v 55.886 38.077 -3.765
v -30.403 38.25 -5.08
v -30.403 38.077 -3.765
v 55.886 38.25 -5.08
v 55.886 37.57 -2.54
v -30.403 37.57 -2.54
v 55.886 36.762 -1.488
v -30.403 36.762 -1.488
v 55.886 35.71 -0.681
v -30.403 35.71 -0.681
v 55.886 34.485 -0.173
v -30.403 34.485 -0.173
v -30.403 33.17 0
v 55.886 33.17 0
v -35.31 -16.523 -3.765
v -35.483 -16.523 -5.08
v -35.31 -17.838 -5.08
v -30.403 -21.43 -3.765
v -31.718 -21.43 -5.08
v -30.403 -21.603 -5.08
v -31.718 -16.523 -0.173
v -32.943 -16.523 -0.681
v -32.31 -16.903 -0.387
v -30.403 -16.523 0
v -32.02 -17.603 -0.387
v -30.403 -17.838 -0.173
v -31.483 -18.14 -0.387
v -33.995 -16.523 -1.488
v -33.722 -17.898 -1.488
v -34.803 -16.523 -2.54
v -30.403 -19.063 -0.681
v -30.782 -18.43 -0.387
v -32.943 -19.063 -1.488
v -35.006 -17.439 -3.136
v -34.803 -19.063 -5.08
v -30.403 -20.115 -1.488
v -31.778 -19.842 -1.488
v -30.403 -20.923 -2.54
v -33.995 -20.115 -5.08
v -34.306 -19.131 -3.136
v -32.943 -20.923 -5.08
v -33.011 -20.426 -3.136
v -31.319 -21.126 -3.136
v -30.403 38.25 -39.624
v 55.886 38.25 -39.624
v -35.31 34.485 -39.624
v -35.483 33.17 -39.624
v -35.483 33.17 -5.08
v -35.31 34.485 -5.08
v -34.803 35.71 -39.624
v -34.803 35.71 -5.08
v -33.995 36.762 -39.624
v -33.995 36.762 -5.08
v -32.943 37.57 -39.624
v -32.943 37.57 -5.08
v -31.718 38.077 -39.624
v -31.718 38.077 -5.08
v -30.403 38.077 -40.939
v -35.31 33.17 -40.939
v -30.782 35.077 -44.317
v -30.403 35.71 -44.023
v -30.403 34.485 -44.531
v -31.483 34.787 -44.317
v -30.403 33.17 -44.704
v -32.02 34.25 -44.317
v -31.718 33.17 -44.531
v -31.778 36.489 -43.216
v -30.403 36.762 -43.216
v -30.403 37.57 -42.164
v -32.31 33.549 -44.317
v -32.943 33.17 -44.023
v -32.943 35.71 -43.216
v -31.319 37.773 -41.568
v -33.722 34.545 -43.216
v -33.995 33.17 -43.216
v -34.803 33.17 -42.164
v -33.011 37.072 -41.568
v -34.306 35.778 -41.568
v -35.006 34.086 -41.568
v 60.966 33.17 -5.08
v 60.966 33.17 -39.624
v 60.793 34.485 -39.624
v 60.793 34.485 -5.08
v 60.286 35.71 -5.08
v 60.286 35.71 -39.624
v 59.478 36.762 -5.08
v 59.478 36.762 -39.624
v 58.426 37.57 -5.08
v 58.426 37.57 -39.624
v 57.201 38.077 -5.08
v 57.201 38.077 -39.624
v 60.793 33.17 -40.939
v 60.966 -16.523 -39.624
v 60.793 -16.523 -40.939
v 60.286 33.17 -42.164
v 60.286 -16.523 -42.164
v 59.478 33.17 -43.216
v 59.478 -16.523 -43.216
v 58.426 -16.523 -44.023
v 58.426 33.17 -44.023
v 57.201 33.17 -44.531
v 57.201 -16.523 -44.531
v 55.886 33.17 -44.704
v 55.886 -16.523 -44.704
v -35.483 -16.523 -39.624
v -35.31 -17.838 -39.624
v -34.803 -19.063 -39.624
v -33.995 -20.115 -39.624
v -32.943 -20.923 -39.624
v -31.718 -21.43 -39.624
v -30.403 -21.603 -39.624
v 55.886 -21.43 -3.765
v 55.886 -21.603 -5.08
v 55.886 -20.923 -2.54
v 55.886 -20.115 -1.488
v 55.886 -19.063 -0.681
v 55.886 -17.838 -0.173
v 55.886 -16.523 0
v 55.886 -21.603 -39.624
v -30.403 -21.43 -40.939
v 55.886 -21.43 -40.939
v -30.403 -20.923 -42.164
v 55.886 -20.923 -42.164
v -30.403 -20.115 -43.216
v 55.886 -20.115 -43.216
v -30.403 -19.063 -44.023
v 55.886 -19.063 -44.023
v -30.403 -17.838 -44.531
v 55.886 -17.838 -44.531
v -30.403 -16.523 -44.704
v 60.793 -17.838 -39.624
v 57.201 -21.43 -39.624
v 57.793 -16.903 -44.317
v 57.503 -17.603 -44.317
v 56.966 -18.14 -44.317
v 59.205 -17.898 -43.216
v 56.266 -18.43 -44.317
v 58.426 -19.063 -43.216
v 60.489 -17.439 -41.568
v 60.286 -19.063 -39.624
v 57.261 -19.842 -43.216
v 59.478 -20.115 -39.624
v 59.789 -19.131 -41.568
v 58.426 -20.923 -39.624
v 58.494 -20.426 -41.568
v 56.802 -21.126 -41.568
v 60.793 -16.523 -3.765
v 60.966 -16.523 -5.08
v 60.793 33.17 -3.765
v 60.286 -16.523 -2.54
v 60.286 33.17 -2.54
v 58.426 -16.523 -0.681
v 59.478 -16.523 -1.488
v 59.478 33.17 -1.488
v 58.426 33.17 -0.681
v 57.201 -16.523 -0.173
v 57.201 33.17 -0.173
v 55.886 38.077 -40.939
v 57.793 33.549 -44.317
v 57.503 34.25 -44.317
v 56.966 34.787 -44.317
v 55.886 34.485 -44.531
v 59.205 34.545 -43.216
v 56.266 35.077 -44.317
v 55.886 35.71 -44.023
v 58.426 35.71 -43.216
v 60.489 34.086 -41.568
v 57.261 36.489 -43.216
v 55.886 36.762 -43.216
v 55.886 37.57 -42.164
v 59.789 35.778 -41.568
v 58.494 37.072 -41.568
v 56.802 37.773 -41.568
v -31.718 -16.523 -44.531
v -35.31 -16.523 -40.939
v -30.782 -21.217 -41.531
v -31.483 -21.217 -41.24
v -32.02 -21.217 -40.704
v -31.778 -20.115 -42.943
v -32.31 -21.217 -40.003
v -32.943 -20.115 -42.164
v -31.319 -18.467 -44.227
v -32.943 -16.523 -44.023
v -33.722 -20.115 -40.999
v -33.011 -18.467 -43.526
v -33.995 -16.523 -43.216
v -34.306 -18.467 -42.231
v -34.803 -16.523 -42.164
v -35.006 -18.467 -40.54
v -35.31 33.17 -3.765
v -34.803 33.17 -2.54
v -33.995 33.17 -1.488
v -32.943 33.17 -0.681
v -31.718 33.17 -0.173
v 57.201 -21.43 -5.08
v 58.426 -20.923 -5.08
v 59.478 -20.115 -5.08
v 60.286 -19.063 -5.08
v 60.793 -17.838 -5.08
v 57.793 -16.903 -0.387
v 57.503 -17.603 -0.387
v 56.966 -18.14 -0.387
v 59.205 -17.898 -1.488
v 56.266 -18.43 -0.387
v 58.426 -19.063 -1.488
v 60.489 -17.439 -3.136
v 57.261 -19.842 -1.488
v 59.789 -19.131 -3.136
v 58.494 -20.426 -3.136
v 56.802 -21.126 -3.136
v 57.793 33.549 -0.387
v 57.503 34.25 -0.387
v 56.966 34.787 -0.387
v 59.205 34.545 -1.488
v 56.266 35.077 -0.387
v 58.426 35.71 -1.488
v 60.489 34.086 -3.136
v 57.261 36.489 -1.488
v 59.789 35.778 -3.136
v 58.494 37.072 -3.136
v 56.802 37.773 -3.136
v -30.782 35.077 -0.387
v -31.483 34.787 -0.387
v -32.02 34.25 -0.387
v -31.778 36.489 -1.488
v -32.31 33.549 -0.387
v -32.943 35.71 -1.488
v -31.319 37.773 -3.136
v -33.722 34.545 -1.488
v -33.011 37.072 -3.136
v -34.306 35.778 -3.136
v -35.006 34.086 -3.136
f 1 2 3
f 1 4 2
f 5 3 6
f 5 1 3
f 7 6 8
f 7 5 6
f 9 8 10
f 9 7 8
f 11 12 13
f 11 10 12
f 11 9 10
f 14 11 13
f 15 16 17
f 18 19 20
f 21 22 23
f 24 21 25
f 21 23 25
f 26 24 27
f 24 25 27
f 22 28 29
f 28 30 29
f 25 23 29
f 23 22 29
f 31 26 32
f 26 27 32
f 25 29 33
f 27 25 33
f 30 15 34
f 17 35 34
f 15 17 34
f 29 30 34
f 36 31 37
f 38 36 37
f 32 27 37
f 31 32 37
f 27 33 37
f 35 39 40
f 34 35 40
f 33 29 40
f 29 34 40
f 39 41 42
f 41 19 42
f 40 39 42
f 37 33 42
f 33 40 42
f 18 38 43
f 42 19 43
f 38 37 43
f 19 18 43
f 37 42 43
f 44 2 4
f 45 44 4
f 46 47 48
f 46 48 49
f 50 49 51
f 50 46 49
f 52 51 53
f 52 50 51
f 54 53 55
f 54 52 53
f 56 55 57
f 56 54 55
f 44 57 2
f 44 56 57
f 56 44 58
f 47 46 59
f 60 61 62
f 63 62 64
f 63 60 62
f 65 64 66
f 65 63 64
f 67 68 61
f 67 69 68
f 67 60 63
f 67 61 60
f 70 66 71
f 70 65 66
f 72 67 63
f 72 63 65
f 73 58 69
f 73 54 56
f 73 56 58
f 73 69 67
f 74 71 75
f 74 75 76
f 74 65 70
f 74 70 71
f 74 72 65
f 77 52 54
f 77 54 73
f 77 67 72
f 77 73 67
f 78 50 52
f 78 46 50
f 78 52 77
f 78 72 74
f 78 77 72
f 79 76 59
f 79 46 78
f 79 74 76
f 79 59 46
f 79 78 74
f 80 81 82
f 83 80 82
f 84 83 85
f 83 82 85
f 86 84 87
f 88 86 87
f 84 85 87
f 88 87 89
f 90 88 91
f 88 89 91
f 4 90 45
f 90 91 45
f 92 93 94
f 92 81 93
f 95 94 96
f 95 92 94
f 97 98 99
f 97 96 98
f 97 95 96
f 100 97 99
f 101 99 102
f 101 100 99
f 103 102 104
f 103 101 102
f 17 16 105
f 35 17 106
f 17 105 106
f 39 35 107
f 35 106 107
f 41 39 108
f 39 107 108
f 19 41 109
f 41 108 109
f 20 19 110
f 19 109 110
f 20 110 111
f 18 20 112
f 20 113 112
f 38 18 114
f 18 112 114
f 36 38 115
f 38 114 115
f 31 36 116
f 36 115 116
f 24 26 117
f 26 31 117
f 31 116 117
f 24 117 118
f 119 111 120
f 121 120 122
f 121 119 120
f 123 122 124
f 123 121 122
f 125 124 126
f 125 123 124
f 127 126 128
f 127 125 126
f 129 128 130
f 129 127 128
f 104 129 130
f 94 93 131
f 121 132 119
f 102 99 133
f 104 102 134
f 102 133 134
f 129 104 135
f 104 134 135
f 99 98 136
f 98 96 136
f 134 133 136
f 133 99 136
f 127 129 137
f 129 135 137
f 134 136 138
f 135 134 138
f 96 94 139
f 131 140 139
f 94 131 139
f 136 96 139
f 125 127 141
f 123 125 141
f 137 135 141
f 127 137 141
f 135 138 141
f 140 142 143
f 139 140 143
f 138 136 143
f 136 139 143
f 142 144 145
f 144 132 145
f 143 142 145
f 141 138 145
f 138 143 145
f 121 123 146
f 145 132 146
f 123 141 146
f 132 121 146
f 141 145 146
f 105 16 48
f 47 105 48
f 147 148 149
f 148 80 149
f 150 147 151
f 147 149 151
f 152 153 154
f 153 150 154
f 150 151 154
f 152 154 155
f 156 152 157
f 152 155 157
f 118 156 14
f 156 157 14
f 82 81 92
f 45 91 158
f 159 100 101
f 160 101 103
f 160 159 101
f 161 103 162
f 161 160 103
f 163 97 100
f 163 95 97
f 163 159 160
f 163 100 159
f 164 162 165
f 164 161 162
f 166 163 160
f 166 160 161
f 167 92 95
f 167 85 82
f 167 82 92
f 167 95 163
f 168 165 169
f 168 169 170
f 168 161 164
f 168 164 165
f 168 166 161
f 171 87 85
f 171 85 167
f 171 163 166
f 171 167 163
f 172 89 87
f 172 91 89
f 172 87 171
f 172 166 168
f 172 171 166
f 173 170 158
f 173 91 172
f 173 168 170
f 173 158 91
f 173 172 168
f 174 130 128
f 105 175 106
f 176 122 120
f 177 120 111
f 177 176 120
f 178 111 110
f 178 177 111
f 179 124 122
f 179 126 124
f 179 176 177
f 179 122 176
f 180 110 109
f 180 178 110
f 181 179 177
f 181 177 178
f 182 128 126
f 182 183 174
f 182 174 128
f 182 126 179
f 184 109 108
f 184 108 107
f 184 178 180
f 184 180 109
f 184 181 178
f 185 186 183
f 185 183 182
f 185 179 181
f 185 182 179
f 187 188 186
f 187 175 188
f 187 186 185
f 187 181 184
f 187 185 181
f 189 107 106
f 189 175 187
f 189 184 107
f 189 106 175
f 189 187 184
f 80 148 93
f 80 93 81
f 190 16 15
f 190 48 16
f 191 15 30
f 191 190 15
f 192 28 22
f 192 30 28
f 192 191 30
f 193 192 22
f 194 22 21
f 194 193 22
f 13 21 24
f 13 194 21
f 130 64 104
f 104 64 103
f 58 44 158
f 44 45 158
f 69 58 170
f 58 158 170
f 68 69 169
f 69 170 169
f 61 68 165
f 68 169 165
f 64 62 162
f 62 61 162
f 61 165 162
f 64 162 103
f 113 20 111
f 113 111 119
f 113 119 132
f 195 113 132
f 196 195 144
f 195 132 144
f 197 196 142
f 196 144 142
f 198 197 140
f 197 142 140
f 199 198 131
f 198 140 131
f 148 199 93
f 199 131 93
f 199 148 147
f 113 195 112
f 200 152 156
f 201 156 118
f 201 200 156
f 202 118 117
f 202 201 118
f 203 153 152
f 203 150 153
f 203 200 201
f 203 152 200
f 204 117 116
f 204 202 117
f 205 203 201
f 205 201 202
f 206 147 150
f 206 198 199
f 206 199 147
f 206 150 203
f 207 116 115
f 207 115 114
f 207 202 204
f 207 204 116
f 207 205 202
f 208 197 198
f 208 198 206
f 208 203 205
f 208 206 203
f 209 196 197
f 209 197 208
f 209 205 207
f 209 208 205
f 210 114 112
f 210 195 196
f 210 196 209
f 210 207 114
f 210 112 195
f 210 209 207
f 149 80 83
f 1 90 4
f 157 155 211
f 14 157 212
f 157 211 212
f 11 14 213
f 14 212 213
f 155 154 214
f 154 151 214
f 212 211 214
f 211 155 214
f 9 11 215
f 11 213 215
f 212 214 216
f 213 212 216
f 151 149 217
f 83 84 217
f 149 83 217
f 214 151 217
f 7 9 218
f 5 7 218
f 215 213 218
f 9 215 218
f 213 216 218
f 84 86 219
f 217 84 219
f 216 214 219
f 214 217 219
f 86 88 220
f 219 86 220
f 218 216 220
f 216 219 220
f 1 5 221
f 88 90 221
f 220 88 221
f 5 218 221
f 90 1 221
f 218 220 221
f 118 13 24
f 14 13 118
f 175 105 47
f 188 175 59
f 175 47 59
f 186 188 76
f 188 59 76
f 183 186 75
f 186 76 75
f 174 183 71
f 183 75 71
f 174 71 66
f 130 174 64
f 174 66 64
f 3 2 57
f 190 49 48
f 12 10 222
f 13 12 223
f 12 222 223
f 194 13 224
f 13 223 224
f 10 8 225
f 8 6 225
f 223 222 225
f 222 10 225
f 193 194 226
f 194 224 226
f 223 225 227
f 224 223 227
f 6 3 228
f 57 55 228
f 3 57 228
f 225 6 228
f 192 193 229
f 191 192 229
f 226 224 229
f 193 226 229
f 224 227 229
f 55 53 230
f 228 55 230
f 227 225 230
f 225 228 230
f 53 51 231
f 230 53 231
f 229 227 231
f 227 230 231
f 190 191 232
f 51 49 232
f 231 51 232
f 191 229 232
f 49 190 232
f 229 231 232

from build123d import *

# Parameters (mm, degrees)
F0_W     = 96.449501
F0_H     = 59.853412
F1_DEPTH = 44.704
F2_R     = 5.08


with BuildPart() as f1:
    # F0 (on Top) → F1 (new body)
    with BuildSketch(Plane.XY):
        with Locations((12.741569, 8.323435)):
            Rectangle(F0_W, F0_H)
    extrude(amount=-F1_DEPTH)

    # F2
    f2_edges = [f1.edges().sort_by_distance(p)[0] for p in [
        (60.96632, -21.603271, -22.352),
        (60.96632, 38.250141, -22.352),
        (60.96632, 8.323435, 0),
        (60.96632, 8.323435, -44.704),
        (-35.483181, 38.250141, -22.352),
        (12.741569, 38.250141, 0),
        (12.741569, 38.250141, -44.704),
        (-35.483181, 8.323435, -44.704),
        (12.741569, -21.603271, -44.704),
        (-35.483181, -21.603271, -22.352),
        (-35.483181, 8.323435, 0),
        (12.741569, -21.603271, 0),
    ]]
    fillet(f2_edges, radius=F2_R)


solid = f1.part
